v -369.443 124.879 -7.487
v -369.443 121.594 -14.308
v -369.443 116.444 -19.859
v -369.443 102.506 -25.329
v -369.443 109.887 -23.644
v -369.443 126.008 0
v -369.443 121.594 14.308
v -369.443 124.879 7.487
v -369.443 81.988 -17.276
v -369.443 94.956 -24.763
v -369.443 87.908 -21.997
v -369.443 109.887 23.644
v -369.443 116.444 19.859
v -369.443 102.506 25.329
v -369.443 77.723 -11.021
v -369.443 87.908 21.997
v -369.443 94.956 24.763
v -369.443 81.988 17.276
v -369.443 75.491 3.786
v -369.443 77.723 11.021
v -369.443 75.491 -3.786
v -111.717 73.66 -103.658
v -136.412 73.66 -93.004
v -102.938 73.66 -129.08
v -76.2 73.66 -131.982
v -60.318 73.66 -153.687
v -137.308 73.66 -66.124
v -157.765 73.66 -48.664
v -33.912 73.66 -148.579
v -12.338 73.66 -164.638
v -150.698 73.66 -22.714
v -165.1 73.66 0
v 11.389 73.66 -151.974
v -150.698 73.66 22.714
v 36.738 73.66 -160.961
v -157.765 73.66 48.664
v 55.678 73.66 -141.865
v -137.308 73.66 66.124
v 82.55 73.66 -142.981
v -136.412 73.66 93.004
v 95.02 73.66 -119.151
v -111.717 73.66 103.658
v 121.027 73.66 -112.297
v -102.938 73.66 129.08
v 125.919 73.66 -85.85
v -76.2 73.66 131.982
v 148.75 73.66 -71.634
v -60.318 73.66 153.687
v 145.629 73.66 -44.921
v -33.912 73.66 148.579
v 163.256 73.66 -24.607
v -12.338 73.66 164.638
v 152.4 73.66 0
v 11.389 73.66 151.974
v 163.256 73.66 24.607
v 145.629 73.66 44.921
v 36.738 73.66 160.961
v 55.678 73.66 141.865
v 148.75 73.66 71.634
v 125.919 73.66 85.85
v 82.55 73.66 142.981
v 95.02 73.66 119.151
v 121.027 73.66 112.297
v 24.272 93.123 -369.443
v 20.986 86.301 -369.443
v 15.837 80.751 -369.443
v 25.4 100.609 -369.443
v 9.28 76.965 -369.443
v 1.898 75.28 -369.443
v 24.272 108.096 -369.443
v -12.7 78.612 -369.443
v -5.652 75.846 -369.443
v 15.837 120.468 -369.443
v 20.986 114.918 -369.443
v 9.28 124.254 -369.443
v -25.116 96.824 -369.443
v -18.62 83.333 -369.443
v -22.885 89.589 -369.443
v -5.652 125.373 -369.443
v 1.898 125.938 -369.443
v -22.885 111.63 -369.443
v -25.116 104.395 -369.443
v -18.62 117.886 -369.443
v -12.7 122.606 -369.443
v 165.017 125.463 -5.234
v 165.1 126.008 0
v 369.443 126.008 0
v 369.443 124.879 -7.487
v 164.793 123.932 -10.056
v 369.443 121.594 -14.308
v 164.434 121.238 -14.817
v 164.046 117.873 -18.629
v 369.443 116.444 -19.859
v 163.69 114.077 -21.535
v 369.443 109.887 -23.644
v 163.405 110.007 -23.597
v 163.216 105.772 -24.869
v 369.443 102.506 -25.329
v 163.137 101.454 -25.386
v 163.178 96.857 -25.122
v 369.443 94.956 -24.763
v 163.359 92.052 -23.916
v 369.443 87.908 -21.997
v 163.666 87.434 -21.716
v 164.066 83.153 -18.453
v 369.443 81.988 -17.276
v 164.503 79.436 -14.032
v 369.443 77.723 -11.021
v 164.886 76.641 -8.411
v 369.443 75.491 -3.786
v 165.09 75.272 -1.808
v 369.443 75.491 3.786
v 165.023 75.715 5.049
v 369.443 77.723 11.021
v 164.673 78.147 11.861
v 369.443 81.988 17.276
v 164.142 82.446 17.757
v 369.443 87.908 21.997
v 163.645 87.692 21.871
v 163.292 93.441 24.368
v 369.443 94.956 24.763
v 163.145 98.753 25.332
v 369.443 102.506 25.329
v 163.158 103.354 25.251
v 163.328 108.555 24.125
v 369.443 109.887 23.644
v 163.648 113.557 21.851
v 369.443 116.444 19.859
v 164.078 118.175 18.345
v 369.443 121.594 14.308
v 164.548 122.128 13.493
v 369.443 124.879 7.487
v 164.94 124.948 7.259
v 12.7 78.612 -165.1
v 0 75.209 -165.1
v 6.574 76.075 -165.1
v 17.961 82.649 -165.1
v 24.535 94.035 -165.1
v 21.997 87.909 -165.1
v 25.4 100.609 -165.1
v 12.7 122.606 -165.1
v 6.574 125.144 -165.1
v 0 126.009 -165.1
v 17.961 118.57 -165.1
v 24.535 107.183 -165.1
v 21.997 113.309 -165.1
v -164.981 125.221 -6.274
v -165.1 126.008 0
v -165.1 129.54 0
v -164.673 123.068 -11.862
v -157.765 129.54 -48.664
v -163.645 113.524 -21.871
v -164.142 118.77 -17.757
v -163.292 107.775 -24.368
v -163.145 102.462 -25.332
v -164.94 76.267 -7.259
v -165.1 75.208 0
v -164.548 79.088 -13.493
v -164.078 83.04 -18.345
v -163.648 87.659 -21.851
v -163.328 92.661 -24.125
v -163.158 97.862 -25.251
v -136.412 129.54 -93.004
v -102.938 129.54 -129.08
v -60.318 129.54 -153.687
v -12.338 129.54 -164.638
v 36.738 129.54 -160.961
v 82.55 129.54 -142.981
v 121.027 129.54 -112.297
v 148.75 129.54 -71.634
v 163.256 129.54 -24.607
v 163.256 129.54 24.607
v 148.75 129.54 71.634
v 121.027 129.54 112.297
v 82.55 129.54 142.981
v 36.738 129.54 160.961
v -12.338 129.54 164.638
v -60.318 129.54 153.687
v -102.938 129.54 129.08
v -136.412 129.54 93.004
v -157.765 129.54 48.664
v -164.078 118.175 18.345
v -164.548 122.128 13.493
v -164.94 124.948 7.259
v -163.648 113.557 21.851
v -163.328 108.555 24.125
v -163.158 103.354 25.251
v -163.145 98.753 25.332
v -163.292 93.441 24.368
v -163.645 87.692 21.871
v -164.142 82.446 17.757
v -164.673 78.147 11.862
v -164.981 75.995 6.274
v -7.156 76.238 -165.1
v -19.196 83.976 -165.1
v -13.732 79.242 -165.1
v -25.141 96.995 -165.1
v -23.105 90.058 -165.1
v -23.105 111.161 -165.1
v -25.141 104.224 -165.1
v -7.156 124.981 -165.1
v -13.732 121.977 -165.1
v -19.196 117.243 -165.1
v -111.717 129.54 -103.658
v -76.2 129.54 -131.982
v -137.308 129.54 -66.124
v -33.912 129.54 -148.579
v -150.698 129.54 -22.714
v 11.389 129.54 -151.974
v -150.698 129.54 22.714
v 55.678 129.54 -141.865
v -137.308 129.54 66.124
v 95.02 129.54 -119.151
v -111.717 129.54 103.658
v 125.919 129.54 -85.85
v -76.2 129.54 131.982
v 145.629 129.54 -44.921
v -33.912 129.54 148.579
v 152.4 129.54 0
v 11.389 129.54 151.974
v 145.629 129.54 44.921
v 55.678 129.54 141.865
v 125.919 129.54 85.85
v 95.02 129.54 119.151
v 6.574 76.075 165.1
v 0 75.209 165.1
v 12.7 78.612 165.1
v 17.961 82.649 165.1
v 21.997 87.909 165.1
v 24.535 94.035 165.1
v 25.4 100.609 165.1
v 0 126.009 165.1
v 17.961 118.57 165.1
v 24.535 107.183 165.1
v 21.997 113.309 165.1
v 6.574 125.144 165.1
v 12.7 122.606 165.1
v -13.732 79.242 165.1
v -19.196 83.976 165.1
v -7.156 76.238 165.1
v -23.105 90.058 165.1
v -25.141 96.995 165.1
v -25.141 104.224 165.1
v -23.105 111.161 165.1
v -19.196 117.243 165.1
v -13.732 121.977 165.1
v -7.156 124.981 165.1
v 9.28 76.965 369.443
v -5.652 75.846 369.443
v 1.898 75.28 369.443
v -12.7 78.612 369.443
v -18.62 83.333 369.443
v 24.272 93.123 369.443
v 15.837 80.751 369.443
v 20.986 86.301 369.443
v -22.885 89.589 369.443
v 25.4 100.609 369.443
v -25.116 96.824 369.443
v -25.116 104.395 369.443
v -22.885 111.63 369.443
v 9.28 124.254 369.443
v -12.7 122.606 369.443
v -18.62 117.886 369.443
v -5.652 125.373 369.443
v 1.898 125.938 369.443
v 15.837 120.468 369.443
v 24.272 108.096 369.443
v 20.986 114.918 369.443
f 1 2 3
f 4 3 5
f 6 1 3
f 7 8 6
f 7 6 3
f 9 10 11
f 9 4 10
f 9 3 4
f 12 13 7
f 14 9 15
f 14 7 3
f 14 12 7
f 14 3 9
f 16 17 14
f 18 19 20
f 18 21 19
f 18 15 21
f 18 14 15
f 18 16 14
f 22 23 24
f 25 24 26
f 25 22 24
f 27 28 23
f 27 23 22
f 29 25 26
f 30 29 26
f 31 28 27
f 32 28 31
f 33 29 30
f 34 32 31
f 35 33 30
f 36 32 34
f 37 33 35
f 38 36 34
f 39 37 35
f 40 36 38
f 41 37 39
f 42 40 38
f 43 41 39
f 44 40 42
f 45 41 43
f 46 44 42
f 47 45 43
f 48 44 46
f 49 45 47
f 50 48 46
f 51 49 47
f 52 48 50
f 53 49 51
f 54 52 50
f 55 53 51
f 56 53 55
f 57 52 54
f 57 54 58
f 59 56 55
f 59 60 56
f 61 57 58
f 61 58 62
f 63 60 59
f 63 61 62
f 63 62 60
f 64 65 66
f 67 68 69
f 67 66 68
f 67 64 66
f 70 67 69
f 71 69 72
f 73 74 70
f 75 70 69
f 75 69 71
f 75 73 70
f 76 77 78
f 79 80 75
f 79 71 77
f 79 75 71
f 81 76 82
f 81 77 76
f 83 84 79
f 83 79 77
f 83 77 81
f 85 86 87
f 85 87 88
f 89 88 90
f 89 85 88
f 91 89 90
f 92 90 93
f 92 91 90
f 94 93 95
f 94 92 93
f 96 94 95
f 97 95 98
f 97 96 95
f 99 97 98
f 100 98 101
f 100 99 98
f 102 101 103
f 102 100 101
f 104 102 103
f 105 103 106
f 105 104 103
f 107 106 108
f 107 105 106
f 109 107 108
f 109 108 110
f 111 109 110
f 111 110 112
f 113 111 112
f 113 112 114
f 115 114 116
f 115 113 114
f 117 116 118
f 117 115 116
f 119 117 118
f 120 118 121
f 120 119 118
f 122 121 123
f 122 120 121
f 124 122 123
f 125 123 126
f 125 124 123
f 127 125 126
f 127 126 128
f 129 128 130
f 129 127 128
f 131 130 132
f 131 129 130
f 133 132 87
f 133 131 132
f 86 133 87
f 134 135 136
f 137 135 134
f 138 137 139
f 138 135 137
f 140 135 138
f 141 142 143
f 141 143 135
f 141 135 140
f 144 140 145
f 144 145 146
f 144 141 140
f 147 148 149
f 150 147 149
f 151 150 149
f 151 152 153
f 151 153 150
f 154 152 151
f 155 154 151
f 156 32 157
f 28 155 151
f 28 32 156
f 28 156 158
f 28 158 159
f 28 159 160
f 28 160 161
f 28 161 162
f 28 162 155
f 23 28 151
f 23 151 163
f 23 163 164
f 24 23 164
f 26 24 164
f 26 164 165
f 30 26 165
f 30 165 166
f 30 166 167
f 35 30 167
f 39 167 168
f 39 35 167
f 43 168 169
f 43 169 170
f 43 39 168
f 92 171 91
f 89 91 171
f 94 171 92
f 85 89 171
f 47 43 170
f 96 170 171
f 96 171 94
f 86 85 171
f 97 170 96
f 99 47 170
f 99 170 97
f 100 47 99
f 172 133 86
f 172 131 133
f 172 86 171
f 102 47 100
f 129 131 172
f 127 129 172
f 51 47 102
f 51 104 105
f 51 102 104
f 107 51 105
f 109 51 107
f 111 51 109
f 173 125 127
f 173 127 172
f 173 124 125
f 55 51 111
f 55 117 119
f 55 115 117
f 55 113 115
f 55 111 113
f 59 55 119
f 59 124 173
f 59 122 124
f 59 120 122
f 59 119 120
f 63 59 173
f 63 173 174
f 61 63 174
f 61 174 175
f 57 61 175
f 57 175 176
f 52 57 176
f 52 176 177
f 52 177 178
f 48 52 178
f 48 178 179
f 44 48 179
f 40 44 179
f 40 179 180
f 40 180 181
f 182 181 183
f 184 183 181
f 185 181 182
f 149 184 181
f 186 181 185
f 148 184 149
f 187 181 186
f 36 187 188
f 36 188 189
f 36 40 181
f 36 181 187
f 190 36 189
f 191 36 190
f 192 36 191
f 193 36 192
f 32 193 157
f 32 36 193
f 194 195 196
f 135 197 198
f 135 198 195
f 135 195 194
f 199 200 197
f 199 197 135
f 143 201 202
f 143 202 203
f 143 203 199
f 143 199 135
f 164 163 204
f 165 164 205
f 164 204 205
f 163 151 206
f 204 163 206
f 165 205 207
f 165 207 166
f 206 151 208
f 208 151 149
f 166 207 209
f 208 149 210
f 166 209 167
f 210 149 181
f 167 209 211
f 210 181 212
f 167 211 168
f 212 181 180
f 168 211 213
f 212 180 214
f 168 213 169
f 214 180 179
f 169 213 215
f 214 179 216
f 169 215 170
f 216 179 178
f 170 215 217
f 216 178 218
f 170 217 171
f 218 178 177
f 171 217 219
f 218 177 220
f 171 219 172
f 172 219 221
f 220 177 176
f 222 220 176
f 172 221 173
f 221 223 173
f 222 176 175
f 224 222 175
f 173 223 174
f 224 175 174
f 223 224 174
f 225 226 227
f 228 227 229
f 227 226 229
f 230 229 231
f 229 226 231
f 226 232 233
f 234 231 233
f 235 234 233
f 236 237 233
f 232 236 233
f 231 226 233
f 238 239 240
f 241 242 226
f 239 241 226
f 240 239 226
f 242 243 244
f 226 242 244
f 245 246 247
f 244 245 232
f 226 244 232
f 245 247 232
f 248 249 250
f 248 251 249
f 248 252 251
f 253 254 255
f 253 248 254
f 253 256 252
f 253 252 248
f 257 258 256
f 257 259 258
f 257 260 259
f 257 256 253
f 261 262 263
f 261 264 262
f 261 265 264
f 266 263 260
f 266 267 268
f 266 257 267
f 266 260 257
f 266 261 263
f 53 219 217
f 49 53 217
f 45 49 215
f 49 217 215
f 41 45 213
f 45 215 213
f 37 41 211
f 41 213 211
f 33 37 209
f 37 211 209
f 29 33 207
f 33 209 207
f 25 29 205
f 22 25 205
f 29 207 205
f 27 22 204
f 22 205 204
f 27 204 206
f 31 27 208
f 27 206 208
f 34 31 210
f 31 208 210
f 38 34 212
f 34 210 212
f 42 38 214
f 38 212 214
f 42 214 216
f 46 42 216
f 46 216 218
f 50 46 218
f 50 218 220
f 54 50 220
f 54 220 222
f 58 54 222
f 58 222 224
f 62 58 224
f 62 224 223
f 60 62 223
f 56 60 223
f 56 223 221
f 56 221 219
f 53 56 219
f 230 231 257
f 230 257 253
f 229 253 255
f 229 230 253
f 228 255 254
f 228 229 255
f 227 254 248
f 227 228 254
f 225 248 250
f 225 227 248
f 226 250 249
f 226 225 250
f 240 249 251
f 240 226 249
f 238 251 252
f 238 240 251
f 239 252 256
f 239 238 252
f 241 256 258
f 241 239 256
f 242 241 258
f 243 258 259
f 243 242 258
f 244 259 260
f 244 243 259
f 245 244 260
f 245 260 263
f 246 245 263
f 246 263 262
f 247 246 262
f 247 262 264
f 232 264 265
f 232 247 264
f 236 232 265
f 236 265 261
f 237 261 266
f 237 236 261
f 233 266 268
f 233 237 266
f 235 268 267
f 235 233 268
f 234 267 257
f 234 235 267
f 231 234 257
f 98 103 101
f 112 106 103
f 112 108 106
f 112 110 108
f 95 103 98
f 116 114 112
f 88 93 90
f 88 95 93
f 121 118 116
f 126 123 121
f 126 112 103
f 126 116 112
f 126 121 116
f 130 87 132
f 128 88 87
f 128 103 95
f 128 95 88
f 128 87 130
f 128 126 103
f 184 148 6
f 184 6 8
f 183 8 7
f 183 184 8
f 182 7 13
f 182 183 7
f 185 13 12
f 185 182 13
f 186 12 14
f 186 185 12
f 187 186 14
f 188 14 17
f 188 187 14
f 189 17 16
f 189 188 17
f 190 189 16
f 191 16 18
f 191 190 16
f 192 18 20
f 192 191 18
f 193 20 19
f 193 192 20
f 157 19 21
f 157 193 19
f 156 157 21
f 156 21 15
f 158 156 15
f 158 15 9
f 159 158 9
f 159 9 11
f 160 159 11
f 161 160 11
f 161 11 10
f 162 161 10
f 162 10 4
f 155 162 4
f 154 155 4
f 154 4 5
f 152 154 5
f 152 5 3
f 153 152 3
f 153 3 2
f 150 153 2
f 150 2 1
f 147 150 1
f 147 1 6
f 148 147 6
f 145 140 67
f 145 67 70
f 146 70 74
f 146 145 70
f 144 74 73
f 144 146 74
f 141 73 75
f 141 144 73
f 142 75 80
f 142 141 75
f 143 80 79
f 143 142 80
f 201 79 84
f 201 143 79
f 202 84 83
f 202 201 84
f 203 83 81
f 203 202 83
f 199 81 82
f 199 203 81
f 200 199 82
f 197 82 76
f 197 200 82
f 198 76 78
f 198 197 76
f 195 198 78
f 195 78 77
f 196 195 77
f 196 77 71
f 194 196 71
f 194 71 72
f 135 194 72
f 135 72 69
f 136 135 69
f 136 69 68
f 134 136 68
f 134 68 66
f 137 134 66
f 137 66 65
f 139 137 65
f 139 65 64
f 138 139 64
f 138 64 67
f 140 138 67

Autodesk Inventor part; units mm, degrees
sketch "Sketch1" plane through (0, 0, 0) normal (0, 1, 0) x (-1, 0, 0)
  circle A0 centre (0, 0) radius 63.5
  circle A1 centre (0, 0) radius 165.1
  dimension "d0" = 127
  dimension "d1" = 330.2
extrude "Extrusion1" add sketch "Sketch1" along normal blind 152.4
sketch "Sketch2" plane through (0, 0, 0) normal (1, 0, 0) x (0, 1, 0)
  circle A0 centre (100.6077, 0) radius 25.4
  point P0 (0, 0)
  dimension "d4" = 50.8
extrude "Extrusion2" add sketch "Sketch2" along normal mid plane 889
sketch "Sketch4" plane through (0, 152.4, 0) normal (0, 1, 0) x (1, 0, 0)
  circle A0 centre (0, 0) radius 152.4
extrude "Extrusion4" cut sketch "Sketch4" against normal through all
sketch "Sketch5" plane through (0, 152.4, 0) normal (0, 1, 0) x (1, 0, 0)
  circle A0 centre (0, 0) radius 165.1
extrude "Extrusion5" add sketch "Sketch5" along normal blind 50.8 draft -50
ref_plane "Work Plane2" through (75.376, -18.8821, -44.9646) normal (1, 0, 0) x (0, 1, 0)
ref_plane "Work Plane5" through (0, 25.4, 165.1) normal (0, 0, 1) x (1, 0, 0)
sketch "Sketch11" plane through (0, 25.4, 165.1) normal (0, 0, 1) x (1, 0, 0)
  circle A0 centre (0, 75.2094) radius 25.4
  line L0 (165.1, -25.4) -> (-165.1, -25.4) projected
  point P0 (0, -25.4)
  dimension "d31" = 50.8
  dimension "d32" = 100.6094
extrude "Extrusion11" add sketch "Sketch11" along normal blind 280.543
ref_plane "Work Plane6" through (0, 25.4, -165.1) normal (0, 0, 1) x (1, 0, 0)
sketch "Sketch12" plane through (0, 25.4, -165.1) normal (0, 0, 1) x (1, 0, 0)
  circle A0 centre (0, 75.2094) radius 25.4
  line L0 (165.1, -25.4) -> (-165.1, -25.4) projected
  point P0 (0, -25.4)
  dimension "d36" = 50.8
  dimension "d37" = 100.6094
extrude "Extrusion12" add sketch "Sketch12" against normal blind 280.543
ref_plane "Work Plane10" through (0, 152.4, 0) normal (0, -1, 0) x (1, 0, 0)
ref_plane "Work Plane9" through (0, 63.5, 0) normal (0, -1, 0) x (1, 0, 0)
sketch "Sketch13" plane through (0, 152.4, 0) normal (0, -1, 0) x (1, 0, 0)
  line L0 (-199.2875, -201.2037) -> (234.7376, -201.2037)
  line L1 (234.7376, -201.2037) -> (234.7376, 210.7848)
  line L2 (234.7376, 210.7848) -> (-199.2875, 210.7848)
  line L3 (-199.2875, 210.7848) -> (-199.2875, -201.2037)
  point P0 (0, 0)
extrude "Extrusion13" cut sketch "Sketch13" against normal blind 127
sketch "Sketch14" plane through (0, 63.5, 0) normal (0, -1, 0) x (1, 0, 0)
  line L0 (-189.7063, -193.5388) -> (215.5754, -193.5388)
  line L1 (215.5754, -193.5388) -> (215.5754, 199.2875)
  line L2 (215.5754, 199.2875) -> (-189.7063, 199.2875)
  line L3 (-189.7063, 199.2875) -> (-189.7063, -193.5388)
  point P0 (0, 0)
extrude "Extrusion14" cut sketch "Sketch14" along normal blind 127
sketch "Sketch15" plane through (0, 152.4, 0) normal (0, -1, 0) x (1, 0, 0)
  line L0 (-191.281, -206.2668) -> (200.0455, -206.2668)
  line L1 (200.0455, -206.2668) -> (200.0455, 203.7628)
  line L2 (200.0455, 203.7628) -> (-191.281, 203.7628)
  line L3 (-191.281, 203.7628) -> (-191.281, -206.2668)
  point P0 (0, 0)
extrude "Extrusion15" cut sketch "Sketch15" along normal blind 22.86
ref_plane "Work Plane11" through (0, 63.5, 0) normal (0, -1, 0) x (1, 0, 0)
sketch "Sketch16" plane through (0, 63.5, 0) normal (0, -1, 0) x (1, 0, 0)
  line L0 (-192.0144, 196.808) -> (185.6827, 196.808)
  line L1 (185.6827, 196.808) -> (185.6827, -194.7534)
  line L2 (185.6827, -194.7534) -> (-192.0144, -194.7534)
  line L3 (-192.0144, -194.7534) -> (-192.0144, 196.808)
  point P0 (0, 0)
extrude "Extrusion16" cut sketch "Sketch16" against normal blind 10.16
ref_plane "Work Plane13" through (0, 0, 445.643) normal (0, 0, 1) x (1, 0, 0)
ref_plane "Work Plane15" through (-445.643, 0, 0) normal (-1, 0, 0) x (0, -1, 0)
sketch "Sketch17" plane through (0, 0, 445.643) normal (0, 0, 1) x (1, 0, 0)
  line L0 (-47.684, 139.8876) -> (71.13, 139.8876)
  line L1 (71.13, 139.8876) -> (71.13, 50.7534)
  line L2 (71.13, 50.7534) -> (-47.684, 50.7534)
  line L3 (-47.684, 50.7534) -> (-47.684, 139.8876)
  point P0 (0, 0)
extrude "Extrusion17" cut sketch "Sketch17" against normal blind 76.2
sketch "Sketch18" plane through (-445.643, 0, 0) normal (-1, 0, 0) x (0, -1, 0)
  point P0 (0, 0)
sketch "Sketch19" plane through (-445.643, 0, 0) normal (-1, 0, 0) x (0, -1, 0)
  line L0 (28.4387, 69.0414) -> (-174.8187, 69.0414)
  line L1 (-174.8187, 69.0414) -> (-174.8187, -79.7716)
  line L2 (-174.8187, -79.7716) -> (28.4387, -79.7716)
  line L3 (28.4387, -79.7716) -> (28.4387, 69.0414)
  point P0 (0, 0)
extrude "Extrusion18" cut sketch "Sketch19" against normal blind 76.2
ref_plane "Work Plane17" through (445.643, 0, 0) normal (1, 0, 0) x (0, 1, 0)
ref_plane "Work Plane19" through (0, 100.6094, -445.643) normal (0, 0, -1) x (-1, 0, 0)
sketch "Sketch20" plane through (0, 100.6094, -445.643) normal (0, 0, -1) x (-1, 0, 0)
  line L0 (-45.7787, 75.1807) -> (49.441, 75.1807)
  line L1 (49.441, 75.1807) -> (49.441, -71.311)
  line L2 (49.441, -71.311) -> (-45.7787, -71.311)
  line L3 (-45.7787, -71.311) -> (-45.7787, 75.1807)
  point P0 (0, -100.6094)
extrude "Extrusion19" cut sketch "Sketch20" against normal blind 76.2
sketch "Sketch21" plane through (445.643, 0, 0) normal (1, 0, 0) x (0, 1, 0)
  line L0 (168.4656, -97.0508) -> (0, -97.0508)
  line L1 (0, -97.0508) -> (0, 73.2459)
  line L2 (0, 73.2459) -> (168.4656, 73.2459)
  line L3 (168.4656, 73.2459) -> (168.4656, -97.0508)
  point P0 (0, 0)
extrude "Extrusion20" cut sketch "Sketch21" against normal blind 76.2
ref_plane "Work Plane8" through (0, 0, 0) normal (0, -1, 0) x (1, 0, 0)
properties part number "UpperSailCapMid-ver1-1111-2021"
